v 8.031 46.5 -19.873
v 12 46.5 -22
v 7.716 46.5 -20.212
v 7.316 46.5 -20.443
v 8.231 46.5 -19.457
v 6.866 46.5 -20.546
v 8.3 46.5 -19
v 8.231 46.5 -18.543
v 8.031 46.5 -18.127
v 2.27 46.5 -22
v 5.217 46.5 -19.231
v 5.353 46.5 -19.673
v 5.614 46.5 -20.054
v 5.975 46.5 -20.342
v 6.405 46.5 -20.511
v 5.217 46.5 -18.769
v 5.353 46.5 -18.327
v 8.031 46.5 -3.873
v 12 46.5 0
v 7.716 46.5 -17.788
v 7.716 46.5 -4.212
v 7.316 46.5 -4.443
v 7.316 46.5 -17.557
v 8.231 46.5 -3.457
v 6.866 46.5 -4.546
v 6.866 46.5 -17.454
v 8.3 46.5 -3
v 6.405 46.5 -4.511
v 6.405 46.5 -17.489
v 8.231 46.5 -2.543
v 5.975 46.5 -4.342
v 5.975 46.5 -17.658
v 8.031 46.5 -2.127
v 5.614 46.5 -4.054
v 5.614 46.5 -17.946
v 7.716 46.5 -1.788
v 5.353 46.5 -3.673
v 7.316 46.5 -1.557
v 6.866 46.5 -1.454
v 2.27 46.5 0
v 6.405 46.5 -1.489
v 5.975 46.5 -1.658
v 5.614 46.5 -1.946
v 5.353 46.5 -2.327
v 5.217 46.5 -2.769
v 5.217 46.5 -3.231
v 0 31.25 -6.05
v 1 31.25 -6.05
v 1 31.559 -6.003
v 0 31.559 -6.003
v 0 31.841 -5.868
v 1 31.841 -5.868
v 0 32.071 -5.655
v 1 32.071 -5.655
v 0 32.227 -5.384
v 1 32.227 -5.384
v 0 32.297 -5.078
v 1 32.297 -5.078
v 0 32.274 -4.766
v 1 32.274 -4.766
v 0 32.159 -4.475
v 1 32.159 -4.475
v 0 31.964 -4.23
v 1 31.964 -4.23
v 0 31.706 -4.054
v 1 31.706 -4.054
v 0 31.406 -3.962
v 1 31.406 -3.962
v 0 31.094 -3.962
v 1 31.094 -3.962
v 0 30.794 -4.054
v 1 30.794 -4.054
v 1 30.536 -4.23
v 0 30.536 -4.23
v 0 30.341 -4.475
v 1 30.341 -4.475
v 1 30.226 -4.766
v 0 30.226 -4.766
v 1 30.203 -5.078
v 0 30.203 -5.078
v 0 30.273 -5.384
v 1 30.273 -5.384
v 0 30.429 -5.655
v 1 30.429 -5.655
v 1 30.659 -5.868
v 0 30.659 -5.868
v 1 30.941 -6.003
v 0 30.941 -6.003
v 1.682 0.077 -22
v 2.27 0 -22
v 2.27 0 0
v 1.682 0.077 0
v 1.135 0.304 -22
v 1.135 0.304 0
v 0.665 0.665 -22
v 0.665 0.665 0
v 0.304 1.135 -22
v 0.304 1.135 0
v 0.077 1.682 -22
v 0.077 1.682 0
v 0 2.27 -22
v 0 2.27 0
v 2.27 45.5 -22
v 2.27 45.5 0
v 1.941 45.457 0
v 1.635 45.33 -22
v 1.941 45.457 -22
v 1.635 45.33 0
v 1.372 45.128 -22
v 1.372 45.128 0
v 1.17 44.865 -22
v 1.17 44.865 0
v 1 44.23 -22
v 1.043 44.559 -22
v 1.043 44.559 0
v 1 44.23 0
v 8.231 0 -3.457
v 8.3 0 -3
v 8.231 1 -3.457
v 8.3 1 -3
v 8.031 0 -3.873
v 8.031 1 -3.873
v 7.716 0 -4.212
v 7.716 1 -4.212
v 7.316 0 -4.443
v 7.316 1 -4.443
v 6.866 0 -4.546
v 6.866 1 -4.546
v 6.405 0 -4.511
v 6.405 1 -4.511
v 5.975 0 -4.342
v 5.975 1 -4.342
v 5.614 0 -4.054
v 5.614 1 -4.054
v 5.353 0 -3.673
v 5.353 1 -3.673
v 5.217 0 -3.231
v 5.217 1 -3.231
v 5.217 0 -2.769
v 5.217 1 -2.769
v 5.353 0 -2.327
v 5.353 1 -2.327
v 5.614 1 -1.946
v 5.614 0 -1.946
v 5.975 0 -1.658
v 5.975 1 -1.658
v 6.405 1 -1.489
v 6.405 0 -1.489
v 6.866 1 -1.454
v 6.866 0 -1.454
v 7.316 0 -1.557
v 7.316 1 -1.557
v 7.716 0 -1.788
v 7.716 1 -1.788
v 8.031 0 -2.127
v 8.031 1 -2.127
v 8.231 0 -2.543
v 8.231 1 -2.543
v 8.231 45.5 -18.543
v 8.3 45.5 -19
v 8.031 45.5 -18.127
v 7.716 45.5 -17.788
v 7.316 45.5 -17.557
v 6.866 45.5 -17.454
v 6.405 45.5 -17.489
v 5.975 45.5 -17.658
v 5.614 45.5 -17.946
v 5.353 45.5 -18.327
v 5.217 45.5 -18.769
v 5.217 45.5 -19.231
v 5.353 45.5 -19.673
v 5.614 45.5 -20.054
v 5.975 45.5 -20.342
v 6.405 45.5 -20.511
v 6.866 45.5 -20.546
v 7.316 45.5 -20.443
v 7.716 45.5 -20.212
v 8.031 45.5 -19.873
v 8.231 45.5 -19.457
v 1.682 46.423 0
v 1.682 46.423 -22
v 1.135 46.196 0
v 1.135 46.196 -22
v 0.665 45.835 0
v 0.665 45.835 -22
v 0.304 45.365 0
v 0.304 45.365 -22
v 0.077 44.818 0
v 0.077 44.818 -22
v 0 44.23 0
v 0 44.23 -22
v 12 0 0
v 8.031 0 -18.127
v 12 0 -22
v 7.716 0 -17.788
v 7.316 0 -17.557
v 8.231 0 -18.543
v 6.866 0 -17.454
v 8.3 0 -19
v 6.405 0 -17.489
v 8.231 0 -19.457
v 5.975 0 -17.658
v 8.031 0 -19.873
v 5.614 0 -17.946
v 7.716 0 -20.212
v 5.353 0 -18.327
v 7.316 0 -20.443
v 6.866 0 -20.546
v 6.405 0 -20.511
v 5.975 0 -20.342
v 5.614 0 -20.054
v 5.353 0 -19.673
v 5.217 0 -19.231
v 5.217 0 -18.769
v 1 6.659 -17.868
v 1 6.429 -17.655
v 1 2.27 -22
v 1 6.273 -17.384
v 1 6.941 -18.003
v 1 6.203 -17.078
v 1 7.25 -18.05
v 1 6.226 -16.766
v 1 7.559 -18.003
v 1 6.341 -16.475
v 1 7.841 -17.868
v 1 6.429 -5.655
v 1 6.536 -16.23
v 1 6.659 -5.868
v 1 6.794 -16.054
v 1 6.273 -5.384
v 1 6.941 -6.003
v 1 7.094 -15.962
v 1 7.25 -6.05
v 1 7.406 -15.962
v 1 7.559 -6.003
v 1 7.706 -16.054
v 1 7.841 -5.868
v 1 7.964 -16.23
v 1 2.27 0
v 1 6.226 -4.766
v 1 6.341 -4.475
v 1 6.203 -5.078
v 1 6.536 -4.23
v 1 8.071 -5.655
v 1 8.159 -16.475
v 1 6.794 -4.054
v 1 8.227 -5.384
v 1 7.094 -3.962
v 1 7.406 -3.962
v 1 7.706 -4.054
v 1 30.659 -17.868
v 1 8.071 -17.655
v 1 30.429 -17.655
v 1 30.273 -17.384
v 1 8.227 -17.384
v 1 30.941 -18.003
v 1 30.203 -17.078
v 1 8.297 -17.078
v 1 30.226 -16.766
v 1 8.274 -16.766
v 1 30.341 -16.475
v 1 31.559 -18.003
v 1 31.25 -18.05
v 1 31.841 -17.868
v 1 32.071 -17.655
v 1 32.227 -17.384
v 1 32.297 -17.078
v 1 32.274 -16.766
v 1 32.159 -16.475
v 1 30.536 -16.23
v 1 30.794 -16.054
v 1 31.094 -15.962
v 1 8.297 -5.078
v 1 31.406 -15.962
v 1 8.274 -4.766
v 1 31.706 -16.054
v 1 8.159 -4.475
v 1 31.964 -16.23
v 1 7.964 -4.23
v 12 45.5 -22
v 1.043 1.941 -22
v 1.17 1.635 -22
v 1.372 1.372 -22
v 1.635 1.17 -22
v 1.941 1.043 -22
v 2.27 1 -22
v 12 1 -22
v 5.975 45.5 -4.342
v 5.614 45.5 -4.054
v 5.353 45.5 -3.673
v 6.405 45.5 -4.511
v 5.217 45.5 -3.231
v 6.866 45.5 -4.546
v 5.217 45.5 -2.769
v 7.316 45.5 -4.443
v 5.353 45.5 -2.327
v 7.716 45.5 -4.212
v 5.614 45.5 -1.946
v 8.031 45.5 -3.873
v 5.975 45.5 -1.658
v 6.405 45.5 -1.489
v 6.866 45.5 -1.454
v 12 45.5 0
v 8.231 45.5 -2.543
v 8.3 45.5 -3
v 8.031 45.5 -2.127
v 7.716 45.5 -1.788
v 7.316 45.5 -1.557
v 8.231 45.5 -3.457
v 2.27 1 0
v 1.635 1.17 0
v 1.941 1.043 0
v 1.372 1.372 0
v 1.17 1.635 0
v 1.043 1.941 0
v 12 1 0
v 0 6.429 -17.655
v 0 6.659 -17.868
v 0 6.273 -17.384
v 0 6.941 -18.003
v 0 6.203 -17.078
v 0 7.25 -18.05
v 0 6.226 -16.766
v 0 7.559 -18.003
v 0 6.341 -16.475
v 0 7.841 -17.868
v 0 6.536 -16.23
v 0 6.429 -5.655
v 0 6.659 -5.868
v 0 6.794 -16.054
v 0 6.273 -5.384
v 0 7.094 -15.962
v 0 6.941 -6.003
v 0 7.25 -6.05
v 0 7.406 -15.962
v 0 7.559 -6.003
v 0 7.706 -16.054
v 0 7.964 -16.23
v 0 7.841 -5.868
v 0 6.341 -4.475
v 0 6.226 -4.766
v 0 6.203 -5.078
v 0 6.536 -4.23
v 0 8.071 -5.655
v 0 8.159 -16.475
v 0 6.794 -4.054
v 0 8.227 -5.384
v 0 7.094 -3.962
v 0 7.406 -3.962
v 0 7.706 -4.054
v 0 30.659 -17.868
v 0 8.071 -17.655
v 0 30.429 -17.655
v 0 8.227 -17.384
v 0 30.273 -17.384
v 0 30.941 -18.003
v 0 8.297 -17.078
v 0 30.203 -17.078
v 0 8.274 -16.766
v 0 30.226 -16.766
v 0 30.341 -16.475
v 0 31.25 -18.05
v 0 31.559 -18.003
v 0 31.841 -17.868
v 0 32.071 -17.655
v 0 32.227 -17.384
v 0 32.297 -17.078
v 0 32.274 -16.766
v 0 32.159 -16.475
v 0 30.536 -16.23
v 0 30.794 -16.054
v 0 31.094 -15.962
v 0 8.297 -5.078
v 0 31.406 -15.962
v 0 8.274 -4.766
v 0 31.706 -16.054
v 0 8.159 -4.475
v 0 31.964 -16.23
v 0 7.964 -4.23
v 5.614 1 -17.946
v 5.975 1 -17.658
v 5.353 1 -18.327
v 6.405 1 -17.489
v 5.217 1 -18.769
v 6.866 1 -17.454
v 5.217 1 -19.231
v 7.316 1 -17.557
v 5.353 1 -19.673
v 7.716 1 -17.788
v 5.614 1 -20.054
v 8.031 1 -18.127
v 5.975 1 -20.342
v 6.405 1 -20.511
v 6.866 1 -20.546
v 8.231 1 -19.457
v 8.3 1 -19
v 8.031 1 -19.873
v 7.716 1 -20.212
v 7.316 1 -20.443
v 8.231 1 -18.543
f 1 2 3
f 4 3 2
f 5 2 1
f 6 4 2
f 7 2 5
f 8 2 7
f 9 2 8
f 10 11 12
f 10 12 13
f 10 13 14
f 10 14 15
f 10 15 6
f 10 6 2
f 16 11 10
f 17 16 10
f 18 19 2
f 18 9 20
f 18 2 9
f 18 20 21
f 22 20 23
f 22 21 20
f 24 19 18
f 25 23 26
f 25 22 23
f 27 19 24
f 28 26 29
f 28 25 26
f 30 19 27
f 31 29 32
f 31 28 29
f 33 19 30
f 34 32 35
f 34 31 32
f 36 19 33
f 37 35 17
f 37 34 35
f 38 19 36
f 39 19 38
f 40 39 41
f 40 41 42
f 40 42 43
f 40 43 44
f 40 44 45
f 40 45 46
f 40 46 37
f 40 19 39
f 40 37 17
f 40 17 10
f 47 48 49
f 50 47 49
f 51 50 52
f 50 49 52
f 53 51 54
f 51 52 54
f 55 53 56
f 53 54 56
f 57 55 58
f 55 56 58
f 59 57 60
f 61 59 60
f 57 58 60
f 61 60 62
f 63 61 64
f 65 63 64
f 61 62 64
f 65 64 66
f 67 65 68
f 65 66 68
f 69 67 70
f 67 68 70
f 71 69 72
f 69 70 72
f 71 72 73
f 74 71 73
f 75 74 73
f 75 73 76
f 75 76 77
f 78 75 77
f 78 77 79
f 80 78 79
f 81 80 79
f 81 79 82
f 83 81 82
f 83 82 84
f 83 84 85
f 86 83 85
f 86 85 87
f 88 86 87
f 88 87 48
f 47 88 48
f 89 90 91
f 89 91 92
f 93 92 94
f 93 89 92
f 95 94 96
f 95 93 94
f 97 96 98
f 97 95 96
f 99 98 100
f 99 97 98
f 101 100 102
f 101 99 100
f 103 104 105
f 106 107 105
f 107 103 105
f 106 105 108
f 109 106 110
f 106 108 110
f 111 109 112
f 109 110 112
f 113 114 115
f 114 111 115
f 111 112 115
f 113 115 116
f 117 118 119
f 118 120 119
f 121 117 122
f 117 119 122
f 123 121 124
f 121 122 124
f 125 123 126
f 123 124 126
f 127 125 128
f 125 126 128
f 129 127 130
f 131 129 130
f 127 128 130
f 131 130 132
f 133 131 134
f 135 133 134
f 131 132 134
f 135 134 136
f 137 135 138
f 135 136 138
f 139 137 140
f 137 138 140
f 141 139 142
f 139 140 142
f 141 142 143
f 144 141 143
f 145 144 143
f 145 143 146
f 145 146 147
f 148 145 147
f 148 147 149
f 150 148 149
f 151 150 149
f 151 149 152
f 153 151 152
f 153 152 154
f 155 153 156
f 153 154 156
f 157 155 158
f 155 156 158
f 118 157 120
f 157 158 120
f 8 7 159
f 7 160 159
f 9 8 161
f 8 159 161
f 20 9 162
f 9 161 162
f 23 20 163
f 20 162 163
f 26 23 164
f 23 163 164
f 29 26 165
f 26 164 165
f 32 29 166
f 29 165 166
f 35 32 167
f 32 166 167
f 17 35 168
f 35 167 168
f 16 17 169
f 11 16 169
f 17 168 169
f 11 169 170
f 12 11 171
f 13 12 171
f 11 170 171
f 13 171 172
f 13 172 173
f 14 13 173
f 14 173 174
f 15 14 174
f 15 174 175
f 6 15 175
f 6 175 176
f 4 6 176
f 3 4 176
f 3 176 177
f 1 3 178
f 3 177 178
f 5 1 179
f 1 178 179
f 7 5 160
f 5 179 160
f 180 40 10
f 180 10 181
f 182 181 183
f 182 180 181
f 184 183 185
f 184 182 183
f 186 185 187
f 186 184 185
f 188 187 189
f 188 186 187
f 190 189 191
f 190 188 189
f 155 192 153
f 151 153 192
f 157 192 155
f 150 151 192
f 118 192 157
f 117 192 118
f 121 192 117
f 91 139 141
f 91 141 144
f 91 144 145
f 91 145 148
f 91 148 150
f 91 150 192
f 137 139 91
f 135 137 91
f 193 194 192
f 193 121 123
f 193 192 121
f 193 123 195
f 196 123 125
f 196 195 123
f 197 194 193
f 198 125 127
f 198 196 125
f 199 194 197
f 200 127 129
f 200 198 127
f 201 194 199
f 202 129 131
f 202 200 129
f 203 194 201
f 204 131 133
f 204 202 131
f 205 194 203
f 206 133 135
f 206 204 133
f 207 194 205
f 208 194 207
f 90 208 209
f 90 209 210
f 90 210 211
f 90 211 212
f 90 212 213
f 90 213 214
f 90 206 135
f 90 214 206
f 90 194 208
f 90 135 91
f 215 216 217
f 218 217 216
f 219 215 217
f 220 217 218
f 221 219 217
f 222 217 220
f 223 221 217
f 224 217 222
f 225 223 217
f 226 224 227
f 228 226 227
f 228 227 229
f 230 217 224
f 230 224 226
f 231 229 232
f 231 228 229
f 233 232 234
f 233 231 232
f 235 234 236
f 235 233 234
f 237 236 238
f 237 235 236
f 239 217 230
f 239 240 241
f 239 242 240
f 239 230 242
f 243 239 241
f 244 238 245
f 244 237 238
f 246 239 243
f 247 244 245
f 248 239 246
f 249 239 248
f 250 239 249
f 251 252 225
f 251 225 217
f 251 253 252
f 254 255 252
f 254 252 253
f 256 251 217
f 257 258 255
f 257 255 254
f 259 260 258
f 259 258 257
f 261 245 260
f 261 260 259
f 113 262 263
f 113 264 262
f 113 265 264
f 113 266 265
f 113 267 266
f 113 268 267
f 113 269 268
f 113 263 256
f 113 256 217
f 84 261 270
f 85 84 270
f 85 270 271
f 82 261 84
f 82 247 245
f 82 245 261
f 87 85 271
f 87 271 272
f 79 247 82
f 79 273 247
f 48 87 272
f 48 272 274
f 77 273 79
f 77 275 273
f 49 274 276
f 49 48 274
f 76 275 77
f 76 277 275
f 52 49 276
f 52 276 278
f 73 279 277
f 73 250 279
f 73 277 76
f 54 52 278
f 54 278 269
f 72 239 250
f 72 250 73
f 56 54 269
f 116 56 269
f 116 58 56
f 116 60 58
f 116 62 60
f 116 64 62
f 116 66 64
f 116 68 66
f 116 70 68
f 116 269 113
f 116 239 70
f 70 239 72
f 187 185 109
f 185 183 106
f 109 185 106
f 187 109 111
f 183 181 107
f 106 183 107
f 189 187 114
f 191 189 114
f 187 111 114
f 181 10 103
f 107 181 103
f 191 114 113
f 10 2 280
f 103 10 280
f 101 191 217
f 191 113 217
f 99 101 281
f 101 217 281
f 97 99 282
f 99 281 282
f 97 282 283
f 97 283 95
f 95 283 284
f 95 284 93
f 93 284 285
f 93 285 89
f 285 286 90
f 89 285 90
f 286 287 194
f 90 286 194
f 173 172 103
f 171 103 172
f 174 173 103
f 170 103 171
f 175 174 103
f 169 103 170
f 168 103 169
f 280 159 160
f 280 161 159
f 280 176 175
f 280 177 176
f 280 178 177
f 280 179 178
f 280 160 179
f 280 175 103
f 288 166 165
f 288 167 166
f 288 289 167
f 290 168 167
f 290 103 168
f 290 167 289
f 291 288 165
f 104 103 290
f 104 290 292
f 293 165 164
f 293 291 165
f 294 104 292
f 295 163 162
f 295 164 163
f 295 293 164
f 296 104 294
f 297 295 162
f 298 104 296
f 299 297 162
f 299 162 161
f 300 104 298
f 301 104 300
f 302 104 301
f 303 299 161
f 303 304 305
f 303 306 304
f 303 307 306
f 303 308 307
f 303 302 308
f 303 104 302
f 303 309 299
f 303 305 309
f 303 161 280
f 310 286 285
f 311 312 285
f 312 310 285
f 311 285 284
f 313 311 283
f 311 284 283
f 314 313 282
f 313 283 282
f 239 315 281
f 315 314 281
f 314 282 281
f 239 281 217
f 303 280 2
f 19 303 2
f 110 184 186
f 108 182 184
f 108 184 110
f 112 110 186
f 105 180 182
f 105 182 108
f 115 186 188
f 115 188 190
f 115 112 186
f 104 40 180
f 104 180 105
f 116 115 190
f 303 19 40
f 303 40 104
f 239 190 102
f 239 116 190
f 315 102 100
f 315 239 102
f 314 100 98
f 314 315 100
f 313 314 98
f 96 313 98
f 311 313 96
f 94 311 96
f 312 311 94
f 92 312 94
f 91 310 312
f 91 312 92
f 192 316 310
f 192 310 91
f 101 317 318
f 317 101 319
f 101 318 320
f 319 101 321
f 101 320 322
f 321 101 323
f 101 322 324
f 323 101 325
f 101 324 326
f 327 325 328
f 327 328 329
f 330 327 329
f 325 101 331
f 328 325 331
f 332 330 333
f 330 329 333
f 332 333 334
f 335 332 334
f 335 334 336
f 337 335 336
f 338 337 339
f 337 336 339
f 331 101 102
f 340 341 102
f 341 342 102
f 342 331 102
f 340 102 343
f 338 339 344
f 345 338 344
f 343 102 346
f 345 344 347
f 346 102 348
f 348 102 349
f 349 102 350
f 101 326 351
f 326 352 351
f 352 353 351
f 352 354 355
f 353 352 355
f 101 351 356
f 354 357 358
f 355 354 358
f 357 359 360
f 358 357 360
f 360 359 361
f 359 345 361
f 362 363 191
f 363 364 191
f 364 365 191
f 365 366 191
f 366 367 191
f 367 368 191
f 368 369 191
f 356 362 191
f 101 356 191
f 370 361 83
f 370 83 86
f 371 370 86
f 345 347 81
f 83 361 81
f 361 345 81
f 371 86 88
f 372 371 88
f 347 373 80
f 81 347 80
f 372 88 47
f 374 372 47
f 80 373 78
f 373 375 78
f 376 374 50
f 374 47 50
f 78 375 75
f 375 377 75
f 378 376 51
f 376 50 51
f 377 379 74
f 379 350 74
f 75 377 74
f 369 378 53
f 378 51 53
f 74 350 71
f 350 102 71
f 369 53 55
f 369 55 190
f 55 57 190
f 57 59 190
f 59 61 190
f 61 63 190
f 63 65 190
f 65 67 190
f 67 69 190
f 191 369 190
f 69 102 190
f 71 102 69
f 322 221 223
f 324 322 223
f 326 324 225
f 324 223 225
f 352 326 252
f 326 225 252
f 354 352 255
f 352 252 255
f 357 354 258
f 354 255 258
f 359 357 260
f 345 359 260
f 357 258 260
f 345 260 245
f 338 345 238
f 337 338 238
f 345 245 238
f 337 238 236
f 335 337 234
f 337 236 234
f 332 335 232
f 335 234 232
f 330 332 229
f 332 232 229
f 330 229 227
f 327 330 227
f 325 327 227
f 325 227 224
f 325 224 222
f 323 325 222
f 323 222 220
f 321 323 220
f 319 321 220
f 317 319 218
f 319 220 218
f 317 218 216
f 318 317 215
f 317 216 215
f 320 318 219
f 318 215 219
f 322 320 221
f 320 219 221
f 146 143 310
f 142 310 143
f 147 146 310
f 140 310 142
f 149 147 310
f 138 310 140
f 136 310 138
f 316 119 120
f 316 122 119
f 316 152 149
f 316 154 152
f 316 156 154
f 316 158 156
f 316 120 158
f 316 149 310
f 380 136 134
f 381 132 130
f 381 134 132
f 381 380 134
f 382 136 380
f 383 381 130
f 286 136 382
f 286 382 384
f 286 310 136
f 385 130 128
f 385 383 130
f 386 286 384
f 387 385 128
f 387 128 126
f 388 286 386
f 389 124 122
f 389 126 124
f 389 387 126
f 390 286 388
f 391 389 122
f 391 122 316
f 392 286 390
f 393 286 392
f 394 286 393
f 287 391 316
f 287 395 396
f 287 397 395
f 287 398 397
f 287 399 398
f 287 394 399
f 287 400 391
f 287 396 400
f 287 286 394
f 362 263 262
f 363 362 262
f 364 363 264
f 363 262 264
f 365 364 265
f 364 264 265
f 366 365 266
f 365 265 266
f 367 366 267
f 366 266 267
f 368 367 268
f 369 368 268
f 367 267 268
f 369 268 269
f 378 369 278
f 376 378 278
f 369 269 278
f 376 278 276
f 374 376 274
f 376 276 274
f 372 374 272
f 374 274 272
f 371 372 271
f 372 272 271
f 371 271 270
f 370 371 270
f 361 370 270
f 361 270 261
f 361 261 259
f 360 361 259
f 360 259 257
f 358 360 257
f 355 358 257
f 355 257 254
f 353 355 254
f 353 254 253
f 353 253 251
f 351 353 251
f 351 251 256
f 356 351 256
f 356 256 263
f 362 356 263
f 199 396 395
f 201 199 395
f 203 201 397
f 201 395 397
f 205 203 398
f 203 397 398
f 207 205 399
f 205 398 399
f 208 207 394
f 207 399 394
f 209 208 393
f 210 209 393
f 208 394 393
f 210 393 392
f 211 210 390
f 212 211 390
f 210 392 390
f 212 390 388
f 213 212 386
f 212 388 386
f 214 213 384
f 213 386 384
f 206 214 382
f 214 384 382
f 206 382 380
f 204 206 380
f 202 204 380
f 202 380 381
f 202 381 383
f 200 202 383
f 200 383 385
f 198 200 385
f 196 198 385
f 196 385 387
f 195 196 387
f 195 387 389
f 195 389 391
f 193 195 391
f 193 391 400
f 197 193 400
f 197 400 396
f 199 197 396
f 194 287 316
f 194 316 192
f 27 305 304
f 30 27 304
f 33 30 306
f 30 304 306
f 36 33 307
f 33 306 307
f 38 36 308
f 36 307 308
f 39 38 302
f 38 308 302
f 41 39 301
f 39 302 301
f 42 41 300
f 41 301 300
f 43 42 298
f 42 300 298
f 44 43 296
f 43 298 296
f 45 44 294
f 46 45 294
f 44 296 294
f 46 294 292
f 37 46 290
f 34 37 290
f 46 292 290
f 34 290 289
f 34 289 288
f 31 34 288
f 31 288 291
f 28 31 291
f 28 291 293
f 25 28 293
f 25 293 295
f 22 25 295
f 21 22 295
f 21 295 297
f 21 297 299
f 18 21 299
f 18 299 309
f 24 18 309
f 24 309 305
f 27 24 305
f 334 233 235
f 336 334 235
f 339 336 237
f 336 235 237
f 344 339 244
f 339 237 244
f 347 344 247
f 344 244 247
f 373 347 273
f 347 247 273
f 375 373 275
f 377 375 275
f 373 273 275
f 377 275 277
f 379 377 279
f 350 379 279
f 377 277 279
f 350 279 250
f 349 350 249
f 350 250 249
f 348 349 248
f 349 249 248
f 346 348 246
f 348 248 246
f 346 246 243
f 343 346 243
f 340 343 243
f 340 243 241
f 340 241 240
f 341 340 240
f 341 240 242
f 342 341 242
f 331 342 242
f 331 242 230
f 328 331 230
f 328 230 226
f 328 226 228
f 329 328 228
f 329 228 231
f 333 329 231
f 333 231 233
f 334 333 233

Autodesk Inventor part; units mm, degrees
ref_plane "YZ Plane" through (0, 0, 0) normal (1, 0, 0) x (0, 1, 0)
ref_plane "XZ Plane" through (0, 0, 0) normal (0, 1, 0) x (-1, 0, 0)
ref_plane "XY Plane" through (0, 0, 0) normal (0, 0, 1) x (1, 0, 0)
sketch "Boceto1" plane through (0, 0, 0) normal (1, 0, 0) x (0, 1, 0)
  line L0 (0, 0) -> (46.5, 0)
  line L1 (46.5, 0) -> (46.5, -22)
  line L2 (46.5, -22) -> (0, -22)
  line L3 (0, -22) -> (0, 0)
  dimension "d0" = 46.5
  dimension "d1" = 22
extrude "Placa1" add sketch "Boceto1" along normal blind 1
sketch "Boceto2" plane through (0, 45.5, 0) normal (0, 1, 0) x (-1, 0, 0)
  line L0 (0, -22) -> (0, 0)
  line L1 (0, 0) -> (-12, 0)
  line L2 (-12, 0) -> (-12, -22)
  line L3 (-12, -22) -> (0, -22)
edge flange "Pestaña1" height 12 angle 90 thickness 1 bend radius 1.27 thickness toward (0, 1, 0) relief tear relief width 1 relief depth 0.5 corner gap 1 corner form 0 edges at (1, 46.5, -11) (1, 0, -11) wall of the first edge with corners at (0, 45.5, -22) (0, 45.5, 0) (12, 45.5, 0) (12, 45.5, -22)
bend "Doblez1"
corner "Esquina1"
sketch "Boceto3" plane through (1, 0, 0) normal (1, 0, 0) x (0, 0, -1)
  circle A0 centre (17, 7.25) radius 1.05
  line L0 (0, 0) -> (22, 0) projected
  line L1 (0, 2.27) -> (0, 44.23) projected
  line L2 (0, 0) -> (22, 0) construction
  line L3 (11, 0) -> (11, 46.5) construction
  line L4 (22, 46.5) -> (0, 46.5) construction
  circle A1 centre (5, 7.25) radius 1.05
  line L5 (22, 44.23) -> (22, 2.27) projected
  circle A2 centre (17, 31.25) radius 1.05
  circle A3 centre (5, 31.25) radius 1.05
  dimension "d13" = 2.1
  dimension "d14" = 7.25
  dimension "d16" = 2.1
  dimension "d20" = 24
  dimension "d27" = 12
  dimension "d28" = 6
extrude "Cortar1" cut sketch "Boceto3" against normal blind 1
sketch "Boceto4" plane through (12, 1, 0) normal (0, 1, 0) x (1, 0, 0)
  circle A0 centre (-5.25, 19) radius 1.55
  line L0 (-9.73, 22) -> (0, 22) projected
  line L1 (0, 0) -> (0, 22) construction
  line L2 (0, 11) -> (-13.2221, 11) construction
  circle A1 centre (-5.25, 3) radius 1.55
  point P0 (-12, 0)
  point P1 (-12, 22)
  dimension "d29" = 3.1
  dimension "d32" = 3
  dimension "d33" = 6.75
extrude "Extrusión1" cut sketch "Boceto4" along normal through all both and the other way through all
equation "\"d25\" = Grosor"
equation "\"d2\" = Grosor"
equation "\"d3\" = Anchura_desahogo_plegado"
equation "\"d4\" = Profundidad_desahogo_plegado"
equation "\"d5\" = Remanente_mínimo"
equation "\"d6\" = Radiodetransición"
equation "\"d10\" = Tamaño_destalonado"
equation "\"d11\" = TamañoSeparación"
equation "\"d12\" = Tamaño_de_radio_de_Jacobi"
equation "\"Radio_pliegue\" = Grosor"
equation "\"Anchura_desahogo_plegado\" = Grosor"
equation "\"Profundidad_desahogo_plegado\" = 0.5 * Grosor"
equation "\"Tamaño_destalonado\" = 4 * Grosor"
equation "\"Remanente_mínimo\" = 2 * Grosor"
equation "\"Radiodetransición\" = Radio_pliegue"
equation "\"Tamaño_de_radio_de_Jacobi\" = Radio_pliegue"
equation "\"TamañoSeparación\" = Grosor"
equation "\"Grosor\" = 1"
properties part number "MotorSoport"
